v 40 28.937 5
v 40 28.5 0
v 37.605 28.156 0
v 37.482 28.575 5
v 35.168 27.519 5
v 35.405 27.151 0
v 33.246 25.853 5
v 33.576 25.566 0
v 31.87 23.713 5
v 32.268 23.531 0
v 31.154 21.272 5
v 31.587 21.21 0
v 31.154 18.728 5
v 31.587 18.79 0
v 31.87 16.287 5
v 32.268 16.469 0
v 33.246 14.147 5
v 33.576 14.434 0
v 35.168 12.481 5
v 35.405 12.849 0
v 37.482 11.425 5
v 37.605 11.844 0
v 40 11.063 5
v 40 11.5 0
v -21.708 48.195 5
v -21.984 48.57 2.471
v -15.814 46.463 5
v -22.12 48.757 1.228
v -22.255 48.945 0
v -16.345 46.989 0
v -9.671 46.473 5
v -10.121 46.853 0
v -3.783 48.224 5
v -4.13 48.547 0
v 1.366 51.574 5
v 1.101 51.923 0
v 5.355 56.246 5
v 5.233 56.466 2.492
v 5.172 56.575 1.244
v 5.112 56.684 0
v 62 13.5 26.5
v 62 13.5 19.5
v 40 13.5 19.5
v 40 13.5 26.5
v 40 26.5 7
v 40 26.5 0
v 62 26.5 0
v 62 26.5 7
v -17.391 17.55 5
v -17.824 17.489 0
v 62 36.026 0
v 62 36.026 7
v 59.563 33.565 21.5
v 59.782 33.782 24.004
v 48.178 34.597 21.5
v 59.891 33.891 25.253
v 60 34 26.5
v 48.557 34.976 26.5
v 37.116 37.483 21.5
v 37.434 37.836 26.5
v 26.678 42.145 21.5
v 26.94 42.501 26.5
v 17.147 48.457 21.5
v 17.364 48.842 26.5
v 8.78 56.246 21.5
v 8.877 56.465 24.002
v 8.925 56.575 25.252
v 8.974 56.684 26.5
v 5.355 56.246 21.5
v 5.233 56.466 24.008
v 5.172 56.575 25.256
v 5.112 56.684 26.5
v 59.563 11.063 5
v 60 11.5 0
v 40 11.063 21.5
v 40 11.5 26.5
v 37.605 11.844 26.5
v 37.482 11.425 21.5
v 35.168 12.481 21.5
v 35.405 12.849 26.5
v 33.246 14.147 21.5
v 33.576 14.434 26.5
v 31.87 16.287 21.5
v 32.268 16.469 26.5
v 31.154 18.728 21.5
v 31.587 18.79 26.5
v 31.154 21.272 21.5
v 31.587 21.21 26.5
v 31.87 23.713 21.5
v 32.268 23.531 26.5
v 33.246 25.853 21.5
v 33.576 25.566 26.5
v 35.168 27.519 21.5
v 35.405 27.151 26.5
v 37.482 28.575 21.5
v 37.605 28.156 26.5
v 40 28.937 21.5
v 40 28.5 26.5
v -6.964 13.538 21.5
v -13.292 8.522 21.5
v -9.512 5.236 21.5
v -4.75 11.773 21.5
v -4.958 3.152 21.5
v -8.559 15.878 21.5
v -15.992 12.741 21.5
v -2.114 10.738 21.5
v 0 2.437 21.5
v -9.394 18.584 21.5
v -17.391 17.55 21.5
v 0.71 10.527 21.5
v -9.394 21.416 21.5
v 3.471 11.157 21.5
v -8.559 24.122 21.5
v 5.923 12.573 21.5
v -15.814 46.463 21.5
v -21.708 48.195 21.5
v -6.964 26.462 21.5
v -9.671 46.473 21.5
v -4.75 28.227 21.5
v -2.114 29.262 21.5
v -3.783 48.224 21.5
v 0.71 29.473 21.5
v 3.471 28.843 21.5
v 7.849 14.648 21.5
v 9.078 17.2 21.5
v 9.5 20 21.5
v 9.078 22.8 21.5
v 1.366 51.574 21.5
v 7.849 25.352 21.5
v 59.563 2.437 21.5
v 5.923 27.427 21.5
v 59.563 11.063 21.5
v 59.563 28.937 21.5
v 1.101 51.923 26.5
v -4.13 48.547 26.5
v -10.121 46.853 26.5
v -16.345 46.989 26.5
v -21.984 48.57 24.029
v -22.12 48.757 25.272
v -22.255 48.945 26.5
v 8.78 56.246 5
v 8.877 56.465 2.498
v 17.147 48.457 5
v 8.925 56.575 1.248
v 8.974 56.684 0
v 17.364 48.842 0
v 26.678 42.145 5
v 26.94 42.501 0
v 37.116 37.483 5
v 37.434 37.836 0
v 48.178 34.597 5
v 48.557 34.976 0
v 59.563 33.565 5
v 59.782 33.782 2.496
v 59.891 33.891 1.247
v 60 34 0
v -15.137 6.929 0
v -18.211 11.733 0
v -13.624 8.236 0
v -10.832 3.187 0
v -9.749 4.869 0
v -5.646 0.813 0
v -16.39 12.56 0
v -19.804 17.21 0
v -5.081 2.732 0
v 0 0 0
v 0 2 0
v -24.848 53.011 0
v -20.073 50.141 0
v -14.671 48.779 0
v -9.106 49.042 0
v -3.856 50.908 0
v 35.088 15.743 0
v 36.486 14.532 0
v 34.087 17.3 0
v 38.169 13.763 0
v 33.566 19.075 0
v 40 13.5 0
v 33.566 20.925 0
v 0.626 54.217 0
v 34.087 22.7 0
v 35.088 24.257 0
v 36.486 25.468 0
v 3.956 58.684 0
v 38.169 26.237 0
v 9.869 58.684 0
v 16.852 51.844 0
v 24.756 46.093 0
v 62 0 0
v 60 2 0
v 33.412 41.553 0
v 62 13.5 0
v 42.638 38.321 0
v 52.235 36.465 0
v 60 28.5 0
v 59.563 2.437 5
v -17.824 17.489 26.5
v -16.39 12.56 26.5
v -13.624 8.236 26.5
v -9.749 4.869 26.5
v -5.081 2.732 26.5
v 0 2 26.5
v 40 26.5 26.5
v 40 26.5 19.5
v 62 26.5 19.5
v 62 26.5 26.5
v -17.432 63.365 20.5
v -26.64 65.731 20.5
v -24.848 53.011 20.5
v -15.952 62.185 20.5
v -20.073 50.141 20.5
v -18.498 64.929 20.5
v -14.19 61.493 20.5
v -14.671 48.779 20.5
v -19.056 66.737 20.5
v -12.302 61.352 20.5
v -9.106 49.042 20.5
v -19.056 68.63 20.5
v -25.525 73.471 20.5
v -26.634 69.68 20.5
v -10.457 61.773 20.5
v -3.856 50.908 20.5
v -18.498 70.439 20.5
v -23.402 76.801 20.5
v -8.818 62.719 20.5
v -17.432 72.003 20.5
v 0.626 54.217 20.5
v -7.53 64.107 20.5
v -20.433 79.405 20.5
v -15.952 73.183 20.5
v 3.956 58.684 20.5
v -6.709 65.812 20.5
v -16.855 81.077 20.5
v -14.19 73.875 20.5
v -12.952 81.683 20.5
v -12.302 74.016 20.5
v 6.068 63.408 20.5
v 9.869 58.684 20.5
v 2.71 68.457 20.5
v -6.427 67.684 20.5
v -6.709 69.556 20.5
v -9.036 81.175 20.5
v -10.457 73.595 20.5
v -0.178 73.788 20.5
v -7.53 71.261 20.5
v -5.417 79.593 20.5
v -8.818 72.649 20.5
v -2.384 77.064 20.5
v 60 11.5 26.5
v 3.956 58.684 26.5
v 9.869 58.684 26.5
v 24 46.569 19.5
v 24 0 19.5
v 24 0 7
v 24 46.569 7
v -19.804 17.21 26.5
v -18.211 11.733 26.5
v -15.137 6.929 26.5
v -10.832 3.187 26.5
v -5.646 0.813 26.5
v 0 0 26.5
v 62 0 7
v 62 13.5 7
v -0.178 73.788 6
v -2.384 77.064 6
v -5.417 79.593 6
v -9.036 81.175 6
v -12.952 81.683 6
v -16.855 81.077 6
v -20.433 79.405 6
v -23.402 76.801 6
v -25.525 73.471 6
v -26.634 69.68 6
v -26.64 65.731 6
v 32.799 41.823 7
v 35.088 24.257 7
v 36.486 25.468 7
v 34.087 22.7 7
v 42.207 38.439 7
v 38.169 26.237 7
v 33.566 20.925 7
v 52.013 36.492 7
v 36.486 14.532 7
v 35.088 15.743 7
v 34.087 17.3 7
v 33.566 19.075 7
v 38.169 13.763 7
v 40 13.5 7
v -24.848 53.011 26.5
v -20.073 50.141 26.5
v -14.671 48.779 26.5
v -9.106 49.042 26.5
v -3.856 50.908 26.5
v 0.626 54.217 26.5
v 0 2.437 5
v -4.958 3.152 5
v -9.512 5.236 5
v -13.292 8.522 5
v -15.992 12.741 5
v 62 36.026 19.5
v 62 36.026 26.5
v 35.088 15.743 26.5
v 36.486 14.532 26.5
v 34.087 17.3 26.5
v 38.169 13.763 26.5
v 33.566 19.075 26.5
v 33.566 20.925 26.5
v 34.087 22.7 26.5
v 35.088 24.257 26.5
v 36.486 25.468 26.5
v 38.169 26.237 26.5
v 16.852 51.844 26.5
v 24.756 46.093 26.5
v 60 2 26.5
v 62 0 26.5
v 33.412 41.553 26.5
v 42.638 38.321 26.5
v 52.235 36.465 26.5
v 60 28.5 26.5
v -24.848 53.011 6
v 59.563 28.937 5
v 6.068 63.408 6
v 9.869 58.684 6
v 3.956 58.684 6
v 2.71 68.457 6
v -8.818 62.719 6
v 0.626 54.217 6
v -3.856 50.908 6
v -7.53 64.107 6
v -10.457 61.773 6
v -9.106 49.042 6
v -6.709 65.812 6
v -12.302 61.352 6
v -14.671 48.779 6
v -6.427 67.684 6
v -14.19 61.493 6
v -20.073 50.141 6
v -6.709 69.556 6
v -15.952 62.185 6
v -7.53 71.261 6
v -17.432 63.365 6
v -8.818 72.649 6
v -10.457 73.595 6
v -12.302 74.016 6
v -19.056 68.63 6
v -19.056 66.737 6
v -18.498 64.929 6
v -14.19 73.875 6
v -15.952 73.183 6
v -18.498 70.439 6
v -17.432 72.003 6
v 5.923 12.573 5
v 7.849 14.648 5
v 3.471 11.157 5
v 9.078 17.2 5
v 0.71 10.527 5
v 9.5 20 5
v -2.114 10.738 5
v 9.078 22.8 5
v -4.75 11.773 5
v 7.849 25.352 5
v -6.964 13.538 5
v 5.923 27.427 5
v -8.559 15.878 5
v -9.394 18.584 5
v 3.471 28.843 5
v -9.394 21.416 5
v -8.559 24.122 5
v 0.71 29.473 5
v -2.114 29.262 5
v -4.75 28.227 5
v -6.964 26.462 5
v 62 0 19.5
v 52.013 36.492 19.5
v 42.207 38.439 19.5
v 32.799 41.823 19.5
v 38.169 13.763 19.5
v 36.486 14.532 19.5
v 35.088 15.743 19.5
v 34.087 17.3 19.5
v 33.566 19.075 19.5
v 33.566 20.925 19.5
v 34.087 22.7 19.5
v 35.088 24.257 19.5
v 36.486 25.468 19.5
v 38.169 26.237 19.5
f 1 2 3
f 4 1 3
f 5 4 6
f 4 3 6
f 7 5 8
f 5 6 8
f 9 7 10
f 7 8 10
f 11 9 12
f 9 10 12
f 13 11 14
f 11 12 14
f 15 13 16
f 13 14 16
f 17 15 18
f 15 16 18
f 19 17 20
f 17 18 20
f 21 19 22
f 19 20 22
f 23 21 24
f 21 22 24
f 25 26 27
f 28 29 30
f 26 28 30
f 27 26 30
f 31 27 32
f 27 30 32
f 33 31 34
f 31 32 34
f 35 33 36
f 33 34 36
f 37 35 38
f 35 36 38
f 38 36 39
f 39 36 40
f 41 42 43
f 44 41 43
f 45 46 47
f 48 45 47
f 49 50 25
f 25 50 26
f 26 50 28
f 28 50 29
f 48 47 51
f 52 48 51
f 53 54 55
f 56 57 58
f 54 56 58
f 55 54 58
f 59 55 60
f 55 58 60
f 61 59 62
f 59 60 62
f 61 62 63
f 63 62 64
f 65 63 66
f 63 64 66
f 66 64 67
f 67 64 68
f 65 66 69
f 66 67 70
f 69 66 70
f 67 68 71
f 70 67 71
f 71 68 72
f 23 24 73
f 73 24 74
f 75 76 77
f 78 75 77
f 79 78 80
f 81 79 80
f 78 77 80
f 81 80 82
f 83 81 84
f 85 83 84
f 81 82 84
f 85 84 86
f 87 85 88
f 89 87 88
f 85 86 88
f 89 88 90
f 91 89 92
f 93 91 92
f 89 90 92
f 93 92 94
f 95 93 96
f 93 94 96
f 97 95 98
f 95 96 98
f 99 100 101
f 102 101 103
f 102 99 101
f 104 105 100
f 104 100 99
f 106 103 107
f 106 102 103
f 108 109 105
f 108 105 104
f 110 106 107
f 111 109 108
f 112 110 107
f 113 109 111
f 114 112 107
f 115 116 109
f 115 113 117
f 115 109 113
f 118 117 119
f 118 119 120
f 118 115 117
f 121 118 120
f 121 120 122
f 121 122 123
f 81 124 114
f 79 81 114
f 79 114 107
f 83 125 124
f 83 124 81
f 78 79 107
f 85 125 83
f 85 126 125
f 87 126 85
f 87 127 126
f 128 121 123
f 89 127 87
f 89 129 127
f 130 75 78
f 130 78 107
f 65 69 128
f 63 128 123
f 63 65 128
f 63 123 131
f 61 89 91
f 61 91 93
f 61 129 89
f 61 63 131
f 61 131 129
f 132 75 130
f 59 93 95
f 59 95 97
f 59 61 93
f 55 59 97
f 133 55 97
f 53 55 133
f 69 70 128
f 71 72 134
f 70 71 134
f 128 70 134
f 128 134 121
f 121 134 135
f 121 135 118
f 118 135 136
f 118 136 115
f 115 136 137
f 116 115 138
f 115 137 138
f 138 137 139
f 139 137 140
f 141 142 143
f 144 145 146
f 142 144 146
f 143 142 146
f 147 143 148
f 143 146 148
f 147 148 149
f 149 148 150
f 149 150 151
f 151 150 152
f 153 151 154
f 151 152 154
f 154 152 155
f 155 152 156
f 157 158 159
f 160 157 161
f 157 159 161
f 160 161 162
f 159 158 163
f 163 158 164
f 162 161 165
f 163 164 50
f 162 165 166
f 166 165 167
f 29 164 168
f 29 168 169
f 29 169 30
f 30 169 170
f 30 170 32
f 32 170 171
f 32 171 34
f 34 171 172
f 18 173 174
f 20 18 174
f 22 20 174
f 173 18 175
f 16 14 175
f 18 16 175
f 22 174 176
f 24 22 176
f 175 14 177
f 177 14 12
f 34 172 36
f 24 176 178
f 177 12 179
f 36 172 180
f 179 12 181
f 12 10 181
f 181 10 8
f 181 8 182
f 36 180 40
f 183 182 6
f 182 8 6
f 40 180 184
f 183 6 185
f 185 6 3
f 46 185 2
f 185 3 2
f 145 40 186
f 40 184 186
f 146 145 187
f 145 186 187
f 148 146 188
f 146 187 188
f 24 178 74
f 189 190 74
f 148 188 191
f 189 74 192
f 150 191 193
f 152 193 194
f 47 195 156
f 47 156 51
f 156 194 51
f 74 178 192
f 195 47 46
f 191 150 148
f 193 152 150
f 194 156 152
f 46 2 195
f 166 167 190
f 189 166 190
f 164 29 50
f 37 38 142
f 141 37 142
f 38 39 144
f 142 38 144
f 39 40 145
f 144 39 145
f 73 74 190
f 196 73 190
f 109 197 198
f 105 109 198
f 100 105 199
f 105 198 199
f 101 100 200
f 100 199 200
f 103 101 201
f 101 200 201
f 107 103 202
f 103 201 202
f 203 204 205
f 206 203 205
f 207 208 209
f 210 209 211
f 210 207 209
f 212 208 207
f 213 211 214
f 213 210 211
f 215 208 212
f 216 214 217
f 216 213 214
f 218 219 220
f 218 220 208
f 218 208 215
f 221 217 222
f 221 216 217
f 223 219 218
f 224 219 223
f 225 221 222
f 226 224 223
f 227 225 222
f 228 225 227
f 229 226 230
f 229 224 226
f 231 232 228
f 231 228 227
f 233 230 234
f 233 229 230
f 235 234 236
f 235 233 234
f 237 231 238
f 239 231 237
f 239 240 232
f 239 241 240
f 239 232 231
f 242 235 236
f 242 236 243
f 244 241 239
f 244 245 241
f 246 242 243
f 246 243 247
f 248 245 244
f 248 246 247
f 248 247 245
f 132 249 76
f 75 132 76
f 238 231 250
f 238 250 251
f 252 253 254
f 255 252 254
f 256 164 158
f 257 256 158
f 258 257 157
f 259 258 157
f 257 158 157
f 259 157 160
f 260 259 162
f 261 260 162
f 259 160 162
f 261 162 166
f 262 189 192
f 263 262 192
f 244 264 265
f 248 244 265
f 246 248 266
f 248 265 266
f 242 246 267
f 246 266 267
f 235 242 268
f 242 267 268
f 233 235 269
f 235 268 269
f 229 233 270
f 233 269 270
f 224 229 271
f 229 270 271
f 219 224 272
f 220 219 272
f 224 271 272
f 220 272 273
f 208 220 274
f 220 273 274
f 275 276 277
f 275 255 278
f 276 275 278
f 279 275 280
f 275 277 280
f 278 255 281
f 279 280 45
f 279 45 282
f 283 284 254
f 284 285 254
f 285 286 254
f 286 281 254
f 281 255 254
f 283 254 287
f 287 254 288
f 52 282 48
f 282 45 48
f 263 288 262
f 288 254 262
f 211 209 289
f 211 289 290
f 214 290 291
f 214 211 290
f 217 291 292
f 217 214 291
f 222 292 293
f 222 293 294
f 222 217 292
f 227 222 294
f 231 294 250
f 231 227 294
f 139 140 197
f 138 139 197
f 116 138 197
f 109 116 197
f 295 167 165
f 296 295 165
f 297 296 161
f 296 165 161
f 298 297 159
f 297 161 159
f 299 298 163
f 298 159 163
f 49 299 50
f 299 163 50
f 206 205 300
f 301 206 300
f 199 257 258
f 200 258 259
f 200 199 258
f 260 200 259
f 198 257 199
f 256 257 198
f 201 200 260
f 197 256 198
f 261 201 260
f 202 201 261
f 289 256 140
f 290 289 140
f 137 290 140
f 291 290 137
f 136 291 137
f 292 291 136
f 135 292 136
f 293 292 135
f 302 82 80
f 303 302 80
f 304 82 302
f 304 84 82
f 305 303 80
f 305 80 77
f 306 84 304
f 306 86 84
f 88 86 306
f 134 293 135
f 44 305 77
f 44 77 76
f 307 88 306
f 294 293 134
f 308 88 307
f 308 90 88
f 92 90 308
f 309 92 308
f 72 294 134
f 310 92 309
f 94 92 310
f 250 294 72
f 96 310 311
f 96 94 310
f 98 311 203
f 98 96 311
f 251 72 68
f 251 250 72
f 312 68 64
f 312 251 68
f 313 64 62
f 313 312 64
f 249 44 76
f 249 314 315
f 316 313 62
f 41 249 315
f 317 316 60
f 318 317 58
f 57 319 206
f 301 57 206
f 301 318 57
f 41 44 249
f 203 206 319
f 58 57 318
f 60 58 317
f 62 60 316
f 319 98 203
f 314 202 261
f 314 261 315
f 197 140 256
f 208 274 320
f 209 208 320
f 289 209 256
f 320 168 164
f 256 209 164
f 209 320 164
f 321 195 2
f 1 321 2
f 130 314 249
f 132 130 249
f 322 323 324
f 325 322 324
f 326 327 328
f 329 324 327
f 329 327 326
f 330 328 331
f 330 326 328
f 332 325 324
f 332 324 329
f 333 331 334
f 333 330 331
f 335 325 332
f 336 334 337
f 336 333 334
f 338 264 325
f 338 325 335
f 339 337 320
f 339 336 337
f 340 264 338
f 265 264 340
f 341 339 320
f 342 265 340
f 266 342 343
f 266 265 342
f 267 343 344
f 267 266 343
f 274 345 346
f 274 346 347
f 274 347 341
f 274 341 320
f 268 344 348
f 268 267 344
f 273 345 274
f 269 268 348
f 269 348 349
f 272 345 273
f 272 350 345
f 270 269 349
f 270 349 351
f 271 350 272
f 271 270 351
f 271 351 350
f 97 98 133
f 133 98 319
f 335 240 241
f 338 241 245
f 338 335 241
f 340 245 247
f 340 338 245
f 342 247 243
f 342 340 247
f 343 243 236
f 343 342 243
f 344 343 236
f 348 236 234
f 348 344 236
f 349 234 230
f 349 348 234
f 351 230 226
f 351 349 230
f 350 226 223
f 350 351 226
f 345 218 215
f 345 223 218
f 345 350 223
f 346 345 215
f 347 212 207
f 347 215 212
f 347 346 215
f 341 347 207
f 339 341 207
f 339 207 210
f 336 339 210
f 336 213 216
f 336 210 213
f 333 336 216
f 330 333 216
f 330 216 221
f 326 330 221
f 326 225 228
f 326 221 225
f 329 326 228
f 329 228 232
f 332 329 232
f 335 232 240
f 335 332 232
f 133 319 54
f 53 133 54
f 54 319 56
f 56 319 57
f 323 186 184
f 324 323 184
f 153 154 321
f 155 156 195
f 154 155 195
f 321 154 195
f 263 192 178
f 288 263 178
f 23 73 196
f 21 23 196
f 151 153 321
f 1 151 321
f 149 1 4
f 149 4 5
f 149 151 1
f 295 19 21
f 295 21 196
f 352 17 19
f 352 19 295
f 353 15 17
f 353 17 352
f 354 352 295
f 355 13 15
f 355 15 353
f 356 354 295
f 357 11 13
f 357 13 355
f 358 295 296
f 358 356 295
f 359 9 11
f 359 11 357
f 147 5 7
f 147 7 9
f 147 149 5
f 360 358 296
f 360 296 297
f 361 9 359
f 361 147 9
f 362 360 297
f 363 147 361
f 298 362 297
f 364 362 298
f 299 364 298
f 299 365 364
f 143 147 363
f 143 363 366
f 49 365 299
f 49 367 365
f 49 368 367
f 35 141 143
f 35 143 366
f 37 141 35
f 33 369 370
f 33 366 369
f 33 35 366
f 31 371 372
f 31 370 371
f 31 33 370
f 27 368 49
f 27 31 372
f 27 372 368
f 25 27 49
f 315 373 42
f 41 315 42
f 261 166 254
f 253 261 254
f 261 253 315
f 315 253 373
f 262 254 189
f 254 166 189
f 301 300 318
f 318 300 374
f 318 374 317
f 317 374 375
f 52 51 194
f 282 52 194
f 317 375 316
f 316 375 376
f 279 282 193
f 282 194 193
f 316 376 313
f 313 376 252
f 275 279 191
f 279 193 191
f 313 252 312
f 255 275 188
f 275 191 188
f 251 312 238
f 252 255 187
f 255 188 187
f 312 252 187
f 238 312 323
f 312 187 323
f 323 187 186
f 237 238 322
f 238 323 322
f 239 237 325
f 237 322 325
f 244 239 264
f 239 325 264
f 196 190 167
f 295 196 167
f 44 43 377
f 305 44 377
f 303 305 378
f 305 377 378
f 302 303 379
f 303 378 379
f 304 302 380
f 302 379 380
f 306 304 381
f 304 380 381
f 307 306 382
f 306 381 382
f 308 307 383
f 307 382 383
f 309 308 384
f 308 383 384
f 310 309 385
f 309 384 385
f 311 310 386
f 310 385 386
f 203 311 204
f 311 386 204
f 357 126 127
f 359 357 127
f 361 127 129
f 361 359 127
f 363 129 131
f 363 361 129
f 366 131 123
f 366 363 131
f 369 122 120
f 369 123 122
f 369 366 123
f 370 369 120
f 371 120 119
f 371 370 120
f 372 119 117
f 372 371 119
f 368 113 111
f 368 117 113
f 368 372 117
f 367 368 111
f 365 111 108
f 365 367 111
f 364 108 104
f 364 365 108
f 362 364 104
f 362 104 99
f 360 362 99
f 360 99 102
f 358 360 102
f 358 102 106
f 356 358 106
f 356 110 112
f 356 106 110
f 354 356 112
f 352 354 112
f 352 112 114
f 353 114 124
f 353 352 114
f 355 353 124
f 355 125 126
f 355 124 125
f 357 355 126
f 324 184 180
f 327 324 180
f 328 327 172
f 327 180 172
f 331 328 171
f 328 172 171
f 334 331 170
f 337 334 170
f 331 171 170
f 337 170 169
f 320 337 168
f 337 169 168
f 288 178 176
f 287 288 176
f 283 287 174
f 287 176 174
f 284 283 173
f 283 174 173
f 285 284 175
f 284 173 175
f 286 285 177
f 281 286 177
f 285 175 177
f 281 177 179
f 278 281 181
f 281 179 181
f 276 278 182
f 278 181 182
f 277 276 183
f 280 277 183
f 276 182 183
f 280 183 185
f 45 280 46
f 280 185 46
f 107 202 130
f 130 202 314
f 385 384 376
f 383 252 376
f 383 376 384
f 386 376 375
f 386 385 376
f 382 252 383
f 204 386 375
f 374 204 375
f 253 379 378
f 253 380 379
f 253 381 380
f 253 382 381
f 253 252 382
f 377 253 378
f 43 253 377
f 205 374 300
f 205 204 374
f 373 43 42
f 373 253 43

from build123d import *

# Parameters (mm, degrees)
SKETCH1_R           = 9.5
SKETCH1_R_2         = 6.35
BOSS_EXTRUDE1_DEPTH = 26.5
SKETCH2_W           = 38
SKETCH2_H           = 12.5
CUT_EXTRUDE1_DEPTH  = 106.917446478
CUT_EXTRUDE3_START  = -6
CUT_EXTRUDE3_DEPTH  = 6
SKETCH6_R           = 6.35
CUT_EXTRUDE4_DEPTH  = 6
CUT_EXTRUDE6_DEPTH  = 5
CUT_EXTRUDE6_DRAFT  = -5
CUT_EXTRUDE7_DEPTH  = 5
CUT_EXTRUDE7_DRAFT  = -5


with BuildPart() as part:
    # Sketch1 → Boss-Extrude1 (new body)
    with BuildSketch(Plane.XY):
        with BuildLine():
            ThreePointArc((-19.80444005, 17.20999027), (-13.118685251, 4.903639601), (0, 0))
            Line((0, 0), (62, 0))
            Line((62, 0), (62, 13.5))
            Line((62, 13.5), (40, 13.5))
            ThreePointArc((40, 13.5), (33.5, 20), (40, 26.5))
            Line((40, 26.5), (62, 26.5))
            Line((62, 26.5), (62, 36.026416032))
            ThreePointArc((62, 36.026416032), (25.339969654, 45.733644305), (-0.177612992, 73.787896774))
            ThreePointArc((-0.177612992, 73.787896774), (-16.854632867, 81.076848535), (-26.639963888, 65.730868394))
            Line((-26.639963888, 65.730868394), (-19.80444005, 17.20999027))
        make_face()
        with Locations((0, 20)):
            Circle(SKETCH1_R, mode=Mode.SUBTRACT)
        with Locations((-12.776855853, 67.683875204)):
            Circle(SKETCH1_R_2, mode=Mode.SUBTRACT)
    extrude(amount=BOSS_EXTRUDE1_DEPTH)

    # Sketch2 → Cut-Extrude1 (cut, through all)
    with BuildSketch(Plane(origin=(0, 0, 0), x_dir=(1, 0, 0), z_dir=(0, 1, 0))):
        with Locations((43, -13.25)):
            Rectangle(SKETCH2_W, SKETCH2_H)
    extrude(amount=CUT_EXTRUDE1_DEPTH, mode=Mode.SUBTRACT)

    # Sketch3 → Cut-Extrude3 (cut)
    with BuildSketch(Plane.XY.offset(26.5).offset(CUT_EXTRUDE3_START)):
        with BuildLine():
            Line((3.956344678, 58.683875204), (9.868578653, 58.683875204))
            ThreePointArc((9.868578653, 58.683875204), (4.331951234, 65.89431889), (-0.177612992, 73.787896774))
            ThreePointArc((-0.177612992, 73.787896774), (-16.854632867, 81.076848535), (-26.639963888, 65.730868394))
            Line((-26.639963888, 65.730868394), (-24.848047694, 53.011236467))
            ThreePointArc((-24.848047694, 53.011236467), (-9.105576946, 49.041940992), (3.956344678, 58.683875204))
        make_face()
    extrude(amount=CUT_EXTRUDE3_DEPTH, mode=Mode.SUBTRACT)

    # Sketch6 → Cut-Extrude4 (cut)
    with BuildSketch(Plane(origin=(0, 0, 0), x_dir=(-1, 0, 0), z_dir=(0, 0, -1))):
        with BuildLine():
            Line((-9.868578653, 58.683875204), (-3.956344678, 58.683875204))
            ThreePointArc((-3.956344678, 58.683875204), (9.105576946, 49.041940992), (24.848047694, 53.011236467))
            Line((24.848047694, 53.011236467), (26.639963888, 65.730868394))
            ThreePointArc((26.639963888, 65.730868394), (16.854632867, 81.076848535), (0.177612992, 73.787896774))
            ThreePointArc((0.177612992, 73.787896774), (-4.331951234, 65.89431889), (-9.868578653, 58.683875204))
        make_face()
        with Locations((12.776855853, 67.683875204)):
            Circle(SKETCH6_R, mode=Mode.SUBTRACT)
    extrude(amount=-CUT_EXTRUDE4_DEPTH, mode=Mode.SUBTRACT)


with BuildPart() as cut_extrude6_tool:
    # Sketch7 → Cut-Extrude6 (with draft: the straight prism first)
    with BuildSketch(Plane.XY.offset(26.5)):
        with BuildLine():
            Line((8.973709214, 56.683875204), (5.111687967, 56.683875204))
            ThreePointArc((5.111687967, 56.683875204), (-7.062338313, 47.476344695), (-22.255412032, 48.944692384))
            Line((-22.255412032, 48.944692384), (-17.823996045, 17.488991243))
            ThreePointArc((-17.823996045, 17.488991243), (-11.806816725, 6.413275641), (0, 2))
            Line((0, 2), (60, 2))
            Line((60, 2), (60, 11.5))
            Line((60, 11.5), (40, 11.5))
            ThreePointArc((40, 11.5), (31.5, 20), (40, 28.5))
            Line((40, 28.5), (60, 28.5))
            Line((60, 28.5), (60, 34.000102209))
            ThreePointArc((60, 34.000102209), (32.089615412, 39.94948966), (8.973709214, 56.683875204))
        make_face()
    extrude(amount=-CUT_EXTRUDE6_DEPTH)
    # Cut-Extrude6: the draft: its side faces are tilted about the plane it starts from
    cut_extrude6_sides = [cut_extrude6_tool.faces().sort_by_distance(p)[0] for p in [
        (7.042698591, 56.683875204, 24),
        (-7.062338313, 47.476344695, 24),
        (-20.039704038, 33.216841814, 24),
        (-11.806816725, 6.413275641, 24),
        (30, 2, 24),
        (60, 6.75, 24),
        (50, 11.5, 24),
        (31.5, 20, 24),
        (50, 28.5, 24),
        (60, 31.250051104, 24),
        (32.089615412, 39.94948966, 24),
    ]]
    draft(cut_extrude6_sides, Plane.XY.offset(26.5), CUT_EXTRUDE6_DRAFT)


with BuildPart() as part_1:
    add(part.part)

    # Cut-Extrude6: cut by cut_extrude6_tool
    add(cut_extrude6_tool.part, mode=Mode.SUBTRACT)


with BuildPart() as cut_extrude7_tool:
    # Sketch8 → Cut-Extrude7 (with draft: the straight prism first)
    with BuildSketch(Plane(origin=(0, 0, 0), x_dir=(-1, 0, 0), z_dir=(0, 0, -1))):
        with BuildLine():
            Line((-5.111687967, 56.683875204), (-8.973709214, 56.683875204))
            ThreePointArc((-8.973709214, 56.683875204), (-32.089615412, 39.94948966), (-60, 34.000102209))
            Line((-60, 34.000102209), (-60, 28.5))
            Line((-60, 28.5), (-40, 28.5))
            ThreePointArc((-40, 28.5), (-31.5, 20), (-40, 11.5))
            Line((-40, 11.5), (-60, 11.5))
            Line((-60, 11.5), (-60, 2))
            Line((-60, 2), (0, 2))
            ThreePointArc((0, 2), (11.806816725, 6.413275641), (17.823996045, 17.488991243))
            Line((17.823996045, 17.488991243), (22.255412032, 48.944692384))
            ThreePointArc((22.255412032, 48.944692384), (7.062338313, 47.476344695), (-5.111687967, 56.683875204))
        make_face()
    extrude(amount=-CUT_EXTRUDE7_DEPTH)
    # Cut-Extrude7: the draft: its side faces are tilted about the plane it starts from
    cut_extrude7_sides = [cut_extrude7_tool.faces().sort_by_distance(p)[0] for p in [
        (7.042698591, 56.683875204, 2.5),
        (32.089615412, 39.94948966, 2.5),
        (60, 31.250051104, 2.5),
        (50, 28.5, 2.5),
        (31.5, 20, 2.5),
        (50, 11.5, 2.5),
        (60, 6.75, 2.5),
        (30, 2, 2.5),
        (-11.806816725, 6.413275641, 2.5),
        (-20.039704038, 33.216841814, 2.5),
        (-7.062338313, 47.476344695, 2.5),
    ]]
    draft(cut_extrude7_sides, Plane(origin=(0, 0, 0), x_dir=(-1, 0, 0), z_dir=(0, 0, -1)), CUT_EXTRUDE7_DRAFT)


with BuildPart() as part_2:
    add(part_1.part)

    # Cut-Extrude7: cut by cut_extrude7_tool
    add(cut_extrude7_tool.part, mode=Mode.SUBTRACT)


solid = part_2.part
